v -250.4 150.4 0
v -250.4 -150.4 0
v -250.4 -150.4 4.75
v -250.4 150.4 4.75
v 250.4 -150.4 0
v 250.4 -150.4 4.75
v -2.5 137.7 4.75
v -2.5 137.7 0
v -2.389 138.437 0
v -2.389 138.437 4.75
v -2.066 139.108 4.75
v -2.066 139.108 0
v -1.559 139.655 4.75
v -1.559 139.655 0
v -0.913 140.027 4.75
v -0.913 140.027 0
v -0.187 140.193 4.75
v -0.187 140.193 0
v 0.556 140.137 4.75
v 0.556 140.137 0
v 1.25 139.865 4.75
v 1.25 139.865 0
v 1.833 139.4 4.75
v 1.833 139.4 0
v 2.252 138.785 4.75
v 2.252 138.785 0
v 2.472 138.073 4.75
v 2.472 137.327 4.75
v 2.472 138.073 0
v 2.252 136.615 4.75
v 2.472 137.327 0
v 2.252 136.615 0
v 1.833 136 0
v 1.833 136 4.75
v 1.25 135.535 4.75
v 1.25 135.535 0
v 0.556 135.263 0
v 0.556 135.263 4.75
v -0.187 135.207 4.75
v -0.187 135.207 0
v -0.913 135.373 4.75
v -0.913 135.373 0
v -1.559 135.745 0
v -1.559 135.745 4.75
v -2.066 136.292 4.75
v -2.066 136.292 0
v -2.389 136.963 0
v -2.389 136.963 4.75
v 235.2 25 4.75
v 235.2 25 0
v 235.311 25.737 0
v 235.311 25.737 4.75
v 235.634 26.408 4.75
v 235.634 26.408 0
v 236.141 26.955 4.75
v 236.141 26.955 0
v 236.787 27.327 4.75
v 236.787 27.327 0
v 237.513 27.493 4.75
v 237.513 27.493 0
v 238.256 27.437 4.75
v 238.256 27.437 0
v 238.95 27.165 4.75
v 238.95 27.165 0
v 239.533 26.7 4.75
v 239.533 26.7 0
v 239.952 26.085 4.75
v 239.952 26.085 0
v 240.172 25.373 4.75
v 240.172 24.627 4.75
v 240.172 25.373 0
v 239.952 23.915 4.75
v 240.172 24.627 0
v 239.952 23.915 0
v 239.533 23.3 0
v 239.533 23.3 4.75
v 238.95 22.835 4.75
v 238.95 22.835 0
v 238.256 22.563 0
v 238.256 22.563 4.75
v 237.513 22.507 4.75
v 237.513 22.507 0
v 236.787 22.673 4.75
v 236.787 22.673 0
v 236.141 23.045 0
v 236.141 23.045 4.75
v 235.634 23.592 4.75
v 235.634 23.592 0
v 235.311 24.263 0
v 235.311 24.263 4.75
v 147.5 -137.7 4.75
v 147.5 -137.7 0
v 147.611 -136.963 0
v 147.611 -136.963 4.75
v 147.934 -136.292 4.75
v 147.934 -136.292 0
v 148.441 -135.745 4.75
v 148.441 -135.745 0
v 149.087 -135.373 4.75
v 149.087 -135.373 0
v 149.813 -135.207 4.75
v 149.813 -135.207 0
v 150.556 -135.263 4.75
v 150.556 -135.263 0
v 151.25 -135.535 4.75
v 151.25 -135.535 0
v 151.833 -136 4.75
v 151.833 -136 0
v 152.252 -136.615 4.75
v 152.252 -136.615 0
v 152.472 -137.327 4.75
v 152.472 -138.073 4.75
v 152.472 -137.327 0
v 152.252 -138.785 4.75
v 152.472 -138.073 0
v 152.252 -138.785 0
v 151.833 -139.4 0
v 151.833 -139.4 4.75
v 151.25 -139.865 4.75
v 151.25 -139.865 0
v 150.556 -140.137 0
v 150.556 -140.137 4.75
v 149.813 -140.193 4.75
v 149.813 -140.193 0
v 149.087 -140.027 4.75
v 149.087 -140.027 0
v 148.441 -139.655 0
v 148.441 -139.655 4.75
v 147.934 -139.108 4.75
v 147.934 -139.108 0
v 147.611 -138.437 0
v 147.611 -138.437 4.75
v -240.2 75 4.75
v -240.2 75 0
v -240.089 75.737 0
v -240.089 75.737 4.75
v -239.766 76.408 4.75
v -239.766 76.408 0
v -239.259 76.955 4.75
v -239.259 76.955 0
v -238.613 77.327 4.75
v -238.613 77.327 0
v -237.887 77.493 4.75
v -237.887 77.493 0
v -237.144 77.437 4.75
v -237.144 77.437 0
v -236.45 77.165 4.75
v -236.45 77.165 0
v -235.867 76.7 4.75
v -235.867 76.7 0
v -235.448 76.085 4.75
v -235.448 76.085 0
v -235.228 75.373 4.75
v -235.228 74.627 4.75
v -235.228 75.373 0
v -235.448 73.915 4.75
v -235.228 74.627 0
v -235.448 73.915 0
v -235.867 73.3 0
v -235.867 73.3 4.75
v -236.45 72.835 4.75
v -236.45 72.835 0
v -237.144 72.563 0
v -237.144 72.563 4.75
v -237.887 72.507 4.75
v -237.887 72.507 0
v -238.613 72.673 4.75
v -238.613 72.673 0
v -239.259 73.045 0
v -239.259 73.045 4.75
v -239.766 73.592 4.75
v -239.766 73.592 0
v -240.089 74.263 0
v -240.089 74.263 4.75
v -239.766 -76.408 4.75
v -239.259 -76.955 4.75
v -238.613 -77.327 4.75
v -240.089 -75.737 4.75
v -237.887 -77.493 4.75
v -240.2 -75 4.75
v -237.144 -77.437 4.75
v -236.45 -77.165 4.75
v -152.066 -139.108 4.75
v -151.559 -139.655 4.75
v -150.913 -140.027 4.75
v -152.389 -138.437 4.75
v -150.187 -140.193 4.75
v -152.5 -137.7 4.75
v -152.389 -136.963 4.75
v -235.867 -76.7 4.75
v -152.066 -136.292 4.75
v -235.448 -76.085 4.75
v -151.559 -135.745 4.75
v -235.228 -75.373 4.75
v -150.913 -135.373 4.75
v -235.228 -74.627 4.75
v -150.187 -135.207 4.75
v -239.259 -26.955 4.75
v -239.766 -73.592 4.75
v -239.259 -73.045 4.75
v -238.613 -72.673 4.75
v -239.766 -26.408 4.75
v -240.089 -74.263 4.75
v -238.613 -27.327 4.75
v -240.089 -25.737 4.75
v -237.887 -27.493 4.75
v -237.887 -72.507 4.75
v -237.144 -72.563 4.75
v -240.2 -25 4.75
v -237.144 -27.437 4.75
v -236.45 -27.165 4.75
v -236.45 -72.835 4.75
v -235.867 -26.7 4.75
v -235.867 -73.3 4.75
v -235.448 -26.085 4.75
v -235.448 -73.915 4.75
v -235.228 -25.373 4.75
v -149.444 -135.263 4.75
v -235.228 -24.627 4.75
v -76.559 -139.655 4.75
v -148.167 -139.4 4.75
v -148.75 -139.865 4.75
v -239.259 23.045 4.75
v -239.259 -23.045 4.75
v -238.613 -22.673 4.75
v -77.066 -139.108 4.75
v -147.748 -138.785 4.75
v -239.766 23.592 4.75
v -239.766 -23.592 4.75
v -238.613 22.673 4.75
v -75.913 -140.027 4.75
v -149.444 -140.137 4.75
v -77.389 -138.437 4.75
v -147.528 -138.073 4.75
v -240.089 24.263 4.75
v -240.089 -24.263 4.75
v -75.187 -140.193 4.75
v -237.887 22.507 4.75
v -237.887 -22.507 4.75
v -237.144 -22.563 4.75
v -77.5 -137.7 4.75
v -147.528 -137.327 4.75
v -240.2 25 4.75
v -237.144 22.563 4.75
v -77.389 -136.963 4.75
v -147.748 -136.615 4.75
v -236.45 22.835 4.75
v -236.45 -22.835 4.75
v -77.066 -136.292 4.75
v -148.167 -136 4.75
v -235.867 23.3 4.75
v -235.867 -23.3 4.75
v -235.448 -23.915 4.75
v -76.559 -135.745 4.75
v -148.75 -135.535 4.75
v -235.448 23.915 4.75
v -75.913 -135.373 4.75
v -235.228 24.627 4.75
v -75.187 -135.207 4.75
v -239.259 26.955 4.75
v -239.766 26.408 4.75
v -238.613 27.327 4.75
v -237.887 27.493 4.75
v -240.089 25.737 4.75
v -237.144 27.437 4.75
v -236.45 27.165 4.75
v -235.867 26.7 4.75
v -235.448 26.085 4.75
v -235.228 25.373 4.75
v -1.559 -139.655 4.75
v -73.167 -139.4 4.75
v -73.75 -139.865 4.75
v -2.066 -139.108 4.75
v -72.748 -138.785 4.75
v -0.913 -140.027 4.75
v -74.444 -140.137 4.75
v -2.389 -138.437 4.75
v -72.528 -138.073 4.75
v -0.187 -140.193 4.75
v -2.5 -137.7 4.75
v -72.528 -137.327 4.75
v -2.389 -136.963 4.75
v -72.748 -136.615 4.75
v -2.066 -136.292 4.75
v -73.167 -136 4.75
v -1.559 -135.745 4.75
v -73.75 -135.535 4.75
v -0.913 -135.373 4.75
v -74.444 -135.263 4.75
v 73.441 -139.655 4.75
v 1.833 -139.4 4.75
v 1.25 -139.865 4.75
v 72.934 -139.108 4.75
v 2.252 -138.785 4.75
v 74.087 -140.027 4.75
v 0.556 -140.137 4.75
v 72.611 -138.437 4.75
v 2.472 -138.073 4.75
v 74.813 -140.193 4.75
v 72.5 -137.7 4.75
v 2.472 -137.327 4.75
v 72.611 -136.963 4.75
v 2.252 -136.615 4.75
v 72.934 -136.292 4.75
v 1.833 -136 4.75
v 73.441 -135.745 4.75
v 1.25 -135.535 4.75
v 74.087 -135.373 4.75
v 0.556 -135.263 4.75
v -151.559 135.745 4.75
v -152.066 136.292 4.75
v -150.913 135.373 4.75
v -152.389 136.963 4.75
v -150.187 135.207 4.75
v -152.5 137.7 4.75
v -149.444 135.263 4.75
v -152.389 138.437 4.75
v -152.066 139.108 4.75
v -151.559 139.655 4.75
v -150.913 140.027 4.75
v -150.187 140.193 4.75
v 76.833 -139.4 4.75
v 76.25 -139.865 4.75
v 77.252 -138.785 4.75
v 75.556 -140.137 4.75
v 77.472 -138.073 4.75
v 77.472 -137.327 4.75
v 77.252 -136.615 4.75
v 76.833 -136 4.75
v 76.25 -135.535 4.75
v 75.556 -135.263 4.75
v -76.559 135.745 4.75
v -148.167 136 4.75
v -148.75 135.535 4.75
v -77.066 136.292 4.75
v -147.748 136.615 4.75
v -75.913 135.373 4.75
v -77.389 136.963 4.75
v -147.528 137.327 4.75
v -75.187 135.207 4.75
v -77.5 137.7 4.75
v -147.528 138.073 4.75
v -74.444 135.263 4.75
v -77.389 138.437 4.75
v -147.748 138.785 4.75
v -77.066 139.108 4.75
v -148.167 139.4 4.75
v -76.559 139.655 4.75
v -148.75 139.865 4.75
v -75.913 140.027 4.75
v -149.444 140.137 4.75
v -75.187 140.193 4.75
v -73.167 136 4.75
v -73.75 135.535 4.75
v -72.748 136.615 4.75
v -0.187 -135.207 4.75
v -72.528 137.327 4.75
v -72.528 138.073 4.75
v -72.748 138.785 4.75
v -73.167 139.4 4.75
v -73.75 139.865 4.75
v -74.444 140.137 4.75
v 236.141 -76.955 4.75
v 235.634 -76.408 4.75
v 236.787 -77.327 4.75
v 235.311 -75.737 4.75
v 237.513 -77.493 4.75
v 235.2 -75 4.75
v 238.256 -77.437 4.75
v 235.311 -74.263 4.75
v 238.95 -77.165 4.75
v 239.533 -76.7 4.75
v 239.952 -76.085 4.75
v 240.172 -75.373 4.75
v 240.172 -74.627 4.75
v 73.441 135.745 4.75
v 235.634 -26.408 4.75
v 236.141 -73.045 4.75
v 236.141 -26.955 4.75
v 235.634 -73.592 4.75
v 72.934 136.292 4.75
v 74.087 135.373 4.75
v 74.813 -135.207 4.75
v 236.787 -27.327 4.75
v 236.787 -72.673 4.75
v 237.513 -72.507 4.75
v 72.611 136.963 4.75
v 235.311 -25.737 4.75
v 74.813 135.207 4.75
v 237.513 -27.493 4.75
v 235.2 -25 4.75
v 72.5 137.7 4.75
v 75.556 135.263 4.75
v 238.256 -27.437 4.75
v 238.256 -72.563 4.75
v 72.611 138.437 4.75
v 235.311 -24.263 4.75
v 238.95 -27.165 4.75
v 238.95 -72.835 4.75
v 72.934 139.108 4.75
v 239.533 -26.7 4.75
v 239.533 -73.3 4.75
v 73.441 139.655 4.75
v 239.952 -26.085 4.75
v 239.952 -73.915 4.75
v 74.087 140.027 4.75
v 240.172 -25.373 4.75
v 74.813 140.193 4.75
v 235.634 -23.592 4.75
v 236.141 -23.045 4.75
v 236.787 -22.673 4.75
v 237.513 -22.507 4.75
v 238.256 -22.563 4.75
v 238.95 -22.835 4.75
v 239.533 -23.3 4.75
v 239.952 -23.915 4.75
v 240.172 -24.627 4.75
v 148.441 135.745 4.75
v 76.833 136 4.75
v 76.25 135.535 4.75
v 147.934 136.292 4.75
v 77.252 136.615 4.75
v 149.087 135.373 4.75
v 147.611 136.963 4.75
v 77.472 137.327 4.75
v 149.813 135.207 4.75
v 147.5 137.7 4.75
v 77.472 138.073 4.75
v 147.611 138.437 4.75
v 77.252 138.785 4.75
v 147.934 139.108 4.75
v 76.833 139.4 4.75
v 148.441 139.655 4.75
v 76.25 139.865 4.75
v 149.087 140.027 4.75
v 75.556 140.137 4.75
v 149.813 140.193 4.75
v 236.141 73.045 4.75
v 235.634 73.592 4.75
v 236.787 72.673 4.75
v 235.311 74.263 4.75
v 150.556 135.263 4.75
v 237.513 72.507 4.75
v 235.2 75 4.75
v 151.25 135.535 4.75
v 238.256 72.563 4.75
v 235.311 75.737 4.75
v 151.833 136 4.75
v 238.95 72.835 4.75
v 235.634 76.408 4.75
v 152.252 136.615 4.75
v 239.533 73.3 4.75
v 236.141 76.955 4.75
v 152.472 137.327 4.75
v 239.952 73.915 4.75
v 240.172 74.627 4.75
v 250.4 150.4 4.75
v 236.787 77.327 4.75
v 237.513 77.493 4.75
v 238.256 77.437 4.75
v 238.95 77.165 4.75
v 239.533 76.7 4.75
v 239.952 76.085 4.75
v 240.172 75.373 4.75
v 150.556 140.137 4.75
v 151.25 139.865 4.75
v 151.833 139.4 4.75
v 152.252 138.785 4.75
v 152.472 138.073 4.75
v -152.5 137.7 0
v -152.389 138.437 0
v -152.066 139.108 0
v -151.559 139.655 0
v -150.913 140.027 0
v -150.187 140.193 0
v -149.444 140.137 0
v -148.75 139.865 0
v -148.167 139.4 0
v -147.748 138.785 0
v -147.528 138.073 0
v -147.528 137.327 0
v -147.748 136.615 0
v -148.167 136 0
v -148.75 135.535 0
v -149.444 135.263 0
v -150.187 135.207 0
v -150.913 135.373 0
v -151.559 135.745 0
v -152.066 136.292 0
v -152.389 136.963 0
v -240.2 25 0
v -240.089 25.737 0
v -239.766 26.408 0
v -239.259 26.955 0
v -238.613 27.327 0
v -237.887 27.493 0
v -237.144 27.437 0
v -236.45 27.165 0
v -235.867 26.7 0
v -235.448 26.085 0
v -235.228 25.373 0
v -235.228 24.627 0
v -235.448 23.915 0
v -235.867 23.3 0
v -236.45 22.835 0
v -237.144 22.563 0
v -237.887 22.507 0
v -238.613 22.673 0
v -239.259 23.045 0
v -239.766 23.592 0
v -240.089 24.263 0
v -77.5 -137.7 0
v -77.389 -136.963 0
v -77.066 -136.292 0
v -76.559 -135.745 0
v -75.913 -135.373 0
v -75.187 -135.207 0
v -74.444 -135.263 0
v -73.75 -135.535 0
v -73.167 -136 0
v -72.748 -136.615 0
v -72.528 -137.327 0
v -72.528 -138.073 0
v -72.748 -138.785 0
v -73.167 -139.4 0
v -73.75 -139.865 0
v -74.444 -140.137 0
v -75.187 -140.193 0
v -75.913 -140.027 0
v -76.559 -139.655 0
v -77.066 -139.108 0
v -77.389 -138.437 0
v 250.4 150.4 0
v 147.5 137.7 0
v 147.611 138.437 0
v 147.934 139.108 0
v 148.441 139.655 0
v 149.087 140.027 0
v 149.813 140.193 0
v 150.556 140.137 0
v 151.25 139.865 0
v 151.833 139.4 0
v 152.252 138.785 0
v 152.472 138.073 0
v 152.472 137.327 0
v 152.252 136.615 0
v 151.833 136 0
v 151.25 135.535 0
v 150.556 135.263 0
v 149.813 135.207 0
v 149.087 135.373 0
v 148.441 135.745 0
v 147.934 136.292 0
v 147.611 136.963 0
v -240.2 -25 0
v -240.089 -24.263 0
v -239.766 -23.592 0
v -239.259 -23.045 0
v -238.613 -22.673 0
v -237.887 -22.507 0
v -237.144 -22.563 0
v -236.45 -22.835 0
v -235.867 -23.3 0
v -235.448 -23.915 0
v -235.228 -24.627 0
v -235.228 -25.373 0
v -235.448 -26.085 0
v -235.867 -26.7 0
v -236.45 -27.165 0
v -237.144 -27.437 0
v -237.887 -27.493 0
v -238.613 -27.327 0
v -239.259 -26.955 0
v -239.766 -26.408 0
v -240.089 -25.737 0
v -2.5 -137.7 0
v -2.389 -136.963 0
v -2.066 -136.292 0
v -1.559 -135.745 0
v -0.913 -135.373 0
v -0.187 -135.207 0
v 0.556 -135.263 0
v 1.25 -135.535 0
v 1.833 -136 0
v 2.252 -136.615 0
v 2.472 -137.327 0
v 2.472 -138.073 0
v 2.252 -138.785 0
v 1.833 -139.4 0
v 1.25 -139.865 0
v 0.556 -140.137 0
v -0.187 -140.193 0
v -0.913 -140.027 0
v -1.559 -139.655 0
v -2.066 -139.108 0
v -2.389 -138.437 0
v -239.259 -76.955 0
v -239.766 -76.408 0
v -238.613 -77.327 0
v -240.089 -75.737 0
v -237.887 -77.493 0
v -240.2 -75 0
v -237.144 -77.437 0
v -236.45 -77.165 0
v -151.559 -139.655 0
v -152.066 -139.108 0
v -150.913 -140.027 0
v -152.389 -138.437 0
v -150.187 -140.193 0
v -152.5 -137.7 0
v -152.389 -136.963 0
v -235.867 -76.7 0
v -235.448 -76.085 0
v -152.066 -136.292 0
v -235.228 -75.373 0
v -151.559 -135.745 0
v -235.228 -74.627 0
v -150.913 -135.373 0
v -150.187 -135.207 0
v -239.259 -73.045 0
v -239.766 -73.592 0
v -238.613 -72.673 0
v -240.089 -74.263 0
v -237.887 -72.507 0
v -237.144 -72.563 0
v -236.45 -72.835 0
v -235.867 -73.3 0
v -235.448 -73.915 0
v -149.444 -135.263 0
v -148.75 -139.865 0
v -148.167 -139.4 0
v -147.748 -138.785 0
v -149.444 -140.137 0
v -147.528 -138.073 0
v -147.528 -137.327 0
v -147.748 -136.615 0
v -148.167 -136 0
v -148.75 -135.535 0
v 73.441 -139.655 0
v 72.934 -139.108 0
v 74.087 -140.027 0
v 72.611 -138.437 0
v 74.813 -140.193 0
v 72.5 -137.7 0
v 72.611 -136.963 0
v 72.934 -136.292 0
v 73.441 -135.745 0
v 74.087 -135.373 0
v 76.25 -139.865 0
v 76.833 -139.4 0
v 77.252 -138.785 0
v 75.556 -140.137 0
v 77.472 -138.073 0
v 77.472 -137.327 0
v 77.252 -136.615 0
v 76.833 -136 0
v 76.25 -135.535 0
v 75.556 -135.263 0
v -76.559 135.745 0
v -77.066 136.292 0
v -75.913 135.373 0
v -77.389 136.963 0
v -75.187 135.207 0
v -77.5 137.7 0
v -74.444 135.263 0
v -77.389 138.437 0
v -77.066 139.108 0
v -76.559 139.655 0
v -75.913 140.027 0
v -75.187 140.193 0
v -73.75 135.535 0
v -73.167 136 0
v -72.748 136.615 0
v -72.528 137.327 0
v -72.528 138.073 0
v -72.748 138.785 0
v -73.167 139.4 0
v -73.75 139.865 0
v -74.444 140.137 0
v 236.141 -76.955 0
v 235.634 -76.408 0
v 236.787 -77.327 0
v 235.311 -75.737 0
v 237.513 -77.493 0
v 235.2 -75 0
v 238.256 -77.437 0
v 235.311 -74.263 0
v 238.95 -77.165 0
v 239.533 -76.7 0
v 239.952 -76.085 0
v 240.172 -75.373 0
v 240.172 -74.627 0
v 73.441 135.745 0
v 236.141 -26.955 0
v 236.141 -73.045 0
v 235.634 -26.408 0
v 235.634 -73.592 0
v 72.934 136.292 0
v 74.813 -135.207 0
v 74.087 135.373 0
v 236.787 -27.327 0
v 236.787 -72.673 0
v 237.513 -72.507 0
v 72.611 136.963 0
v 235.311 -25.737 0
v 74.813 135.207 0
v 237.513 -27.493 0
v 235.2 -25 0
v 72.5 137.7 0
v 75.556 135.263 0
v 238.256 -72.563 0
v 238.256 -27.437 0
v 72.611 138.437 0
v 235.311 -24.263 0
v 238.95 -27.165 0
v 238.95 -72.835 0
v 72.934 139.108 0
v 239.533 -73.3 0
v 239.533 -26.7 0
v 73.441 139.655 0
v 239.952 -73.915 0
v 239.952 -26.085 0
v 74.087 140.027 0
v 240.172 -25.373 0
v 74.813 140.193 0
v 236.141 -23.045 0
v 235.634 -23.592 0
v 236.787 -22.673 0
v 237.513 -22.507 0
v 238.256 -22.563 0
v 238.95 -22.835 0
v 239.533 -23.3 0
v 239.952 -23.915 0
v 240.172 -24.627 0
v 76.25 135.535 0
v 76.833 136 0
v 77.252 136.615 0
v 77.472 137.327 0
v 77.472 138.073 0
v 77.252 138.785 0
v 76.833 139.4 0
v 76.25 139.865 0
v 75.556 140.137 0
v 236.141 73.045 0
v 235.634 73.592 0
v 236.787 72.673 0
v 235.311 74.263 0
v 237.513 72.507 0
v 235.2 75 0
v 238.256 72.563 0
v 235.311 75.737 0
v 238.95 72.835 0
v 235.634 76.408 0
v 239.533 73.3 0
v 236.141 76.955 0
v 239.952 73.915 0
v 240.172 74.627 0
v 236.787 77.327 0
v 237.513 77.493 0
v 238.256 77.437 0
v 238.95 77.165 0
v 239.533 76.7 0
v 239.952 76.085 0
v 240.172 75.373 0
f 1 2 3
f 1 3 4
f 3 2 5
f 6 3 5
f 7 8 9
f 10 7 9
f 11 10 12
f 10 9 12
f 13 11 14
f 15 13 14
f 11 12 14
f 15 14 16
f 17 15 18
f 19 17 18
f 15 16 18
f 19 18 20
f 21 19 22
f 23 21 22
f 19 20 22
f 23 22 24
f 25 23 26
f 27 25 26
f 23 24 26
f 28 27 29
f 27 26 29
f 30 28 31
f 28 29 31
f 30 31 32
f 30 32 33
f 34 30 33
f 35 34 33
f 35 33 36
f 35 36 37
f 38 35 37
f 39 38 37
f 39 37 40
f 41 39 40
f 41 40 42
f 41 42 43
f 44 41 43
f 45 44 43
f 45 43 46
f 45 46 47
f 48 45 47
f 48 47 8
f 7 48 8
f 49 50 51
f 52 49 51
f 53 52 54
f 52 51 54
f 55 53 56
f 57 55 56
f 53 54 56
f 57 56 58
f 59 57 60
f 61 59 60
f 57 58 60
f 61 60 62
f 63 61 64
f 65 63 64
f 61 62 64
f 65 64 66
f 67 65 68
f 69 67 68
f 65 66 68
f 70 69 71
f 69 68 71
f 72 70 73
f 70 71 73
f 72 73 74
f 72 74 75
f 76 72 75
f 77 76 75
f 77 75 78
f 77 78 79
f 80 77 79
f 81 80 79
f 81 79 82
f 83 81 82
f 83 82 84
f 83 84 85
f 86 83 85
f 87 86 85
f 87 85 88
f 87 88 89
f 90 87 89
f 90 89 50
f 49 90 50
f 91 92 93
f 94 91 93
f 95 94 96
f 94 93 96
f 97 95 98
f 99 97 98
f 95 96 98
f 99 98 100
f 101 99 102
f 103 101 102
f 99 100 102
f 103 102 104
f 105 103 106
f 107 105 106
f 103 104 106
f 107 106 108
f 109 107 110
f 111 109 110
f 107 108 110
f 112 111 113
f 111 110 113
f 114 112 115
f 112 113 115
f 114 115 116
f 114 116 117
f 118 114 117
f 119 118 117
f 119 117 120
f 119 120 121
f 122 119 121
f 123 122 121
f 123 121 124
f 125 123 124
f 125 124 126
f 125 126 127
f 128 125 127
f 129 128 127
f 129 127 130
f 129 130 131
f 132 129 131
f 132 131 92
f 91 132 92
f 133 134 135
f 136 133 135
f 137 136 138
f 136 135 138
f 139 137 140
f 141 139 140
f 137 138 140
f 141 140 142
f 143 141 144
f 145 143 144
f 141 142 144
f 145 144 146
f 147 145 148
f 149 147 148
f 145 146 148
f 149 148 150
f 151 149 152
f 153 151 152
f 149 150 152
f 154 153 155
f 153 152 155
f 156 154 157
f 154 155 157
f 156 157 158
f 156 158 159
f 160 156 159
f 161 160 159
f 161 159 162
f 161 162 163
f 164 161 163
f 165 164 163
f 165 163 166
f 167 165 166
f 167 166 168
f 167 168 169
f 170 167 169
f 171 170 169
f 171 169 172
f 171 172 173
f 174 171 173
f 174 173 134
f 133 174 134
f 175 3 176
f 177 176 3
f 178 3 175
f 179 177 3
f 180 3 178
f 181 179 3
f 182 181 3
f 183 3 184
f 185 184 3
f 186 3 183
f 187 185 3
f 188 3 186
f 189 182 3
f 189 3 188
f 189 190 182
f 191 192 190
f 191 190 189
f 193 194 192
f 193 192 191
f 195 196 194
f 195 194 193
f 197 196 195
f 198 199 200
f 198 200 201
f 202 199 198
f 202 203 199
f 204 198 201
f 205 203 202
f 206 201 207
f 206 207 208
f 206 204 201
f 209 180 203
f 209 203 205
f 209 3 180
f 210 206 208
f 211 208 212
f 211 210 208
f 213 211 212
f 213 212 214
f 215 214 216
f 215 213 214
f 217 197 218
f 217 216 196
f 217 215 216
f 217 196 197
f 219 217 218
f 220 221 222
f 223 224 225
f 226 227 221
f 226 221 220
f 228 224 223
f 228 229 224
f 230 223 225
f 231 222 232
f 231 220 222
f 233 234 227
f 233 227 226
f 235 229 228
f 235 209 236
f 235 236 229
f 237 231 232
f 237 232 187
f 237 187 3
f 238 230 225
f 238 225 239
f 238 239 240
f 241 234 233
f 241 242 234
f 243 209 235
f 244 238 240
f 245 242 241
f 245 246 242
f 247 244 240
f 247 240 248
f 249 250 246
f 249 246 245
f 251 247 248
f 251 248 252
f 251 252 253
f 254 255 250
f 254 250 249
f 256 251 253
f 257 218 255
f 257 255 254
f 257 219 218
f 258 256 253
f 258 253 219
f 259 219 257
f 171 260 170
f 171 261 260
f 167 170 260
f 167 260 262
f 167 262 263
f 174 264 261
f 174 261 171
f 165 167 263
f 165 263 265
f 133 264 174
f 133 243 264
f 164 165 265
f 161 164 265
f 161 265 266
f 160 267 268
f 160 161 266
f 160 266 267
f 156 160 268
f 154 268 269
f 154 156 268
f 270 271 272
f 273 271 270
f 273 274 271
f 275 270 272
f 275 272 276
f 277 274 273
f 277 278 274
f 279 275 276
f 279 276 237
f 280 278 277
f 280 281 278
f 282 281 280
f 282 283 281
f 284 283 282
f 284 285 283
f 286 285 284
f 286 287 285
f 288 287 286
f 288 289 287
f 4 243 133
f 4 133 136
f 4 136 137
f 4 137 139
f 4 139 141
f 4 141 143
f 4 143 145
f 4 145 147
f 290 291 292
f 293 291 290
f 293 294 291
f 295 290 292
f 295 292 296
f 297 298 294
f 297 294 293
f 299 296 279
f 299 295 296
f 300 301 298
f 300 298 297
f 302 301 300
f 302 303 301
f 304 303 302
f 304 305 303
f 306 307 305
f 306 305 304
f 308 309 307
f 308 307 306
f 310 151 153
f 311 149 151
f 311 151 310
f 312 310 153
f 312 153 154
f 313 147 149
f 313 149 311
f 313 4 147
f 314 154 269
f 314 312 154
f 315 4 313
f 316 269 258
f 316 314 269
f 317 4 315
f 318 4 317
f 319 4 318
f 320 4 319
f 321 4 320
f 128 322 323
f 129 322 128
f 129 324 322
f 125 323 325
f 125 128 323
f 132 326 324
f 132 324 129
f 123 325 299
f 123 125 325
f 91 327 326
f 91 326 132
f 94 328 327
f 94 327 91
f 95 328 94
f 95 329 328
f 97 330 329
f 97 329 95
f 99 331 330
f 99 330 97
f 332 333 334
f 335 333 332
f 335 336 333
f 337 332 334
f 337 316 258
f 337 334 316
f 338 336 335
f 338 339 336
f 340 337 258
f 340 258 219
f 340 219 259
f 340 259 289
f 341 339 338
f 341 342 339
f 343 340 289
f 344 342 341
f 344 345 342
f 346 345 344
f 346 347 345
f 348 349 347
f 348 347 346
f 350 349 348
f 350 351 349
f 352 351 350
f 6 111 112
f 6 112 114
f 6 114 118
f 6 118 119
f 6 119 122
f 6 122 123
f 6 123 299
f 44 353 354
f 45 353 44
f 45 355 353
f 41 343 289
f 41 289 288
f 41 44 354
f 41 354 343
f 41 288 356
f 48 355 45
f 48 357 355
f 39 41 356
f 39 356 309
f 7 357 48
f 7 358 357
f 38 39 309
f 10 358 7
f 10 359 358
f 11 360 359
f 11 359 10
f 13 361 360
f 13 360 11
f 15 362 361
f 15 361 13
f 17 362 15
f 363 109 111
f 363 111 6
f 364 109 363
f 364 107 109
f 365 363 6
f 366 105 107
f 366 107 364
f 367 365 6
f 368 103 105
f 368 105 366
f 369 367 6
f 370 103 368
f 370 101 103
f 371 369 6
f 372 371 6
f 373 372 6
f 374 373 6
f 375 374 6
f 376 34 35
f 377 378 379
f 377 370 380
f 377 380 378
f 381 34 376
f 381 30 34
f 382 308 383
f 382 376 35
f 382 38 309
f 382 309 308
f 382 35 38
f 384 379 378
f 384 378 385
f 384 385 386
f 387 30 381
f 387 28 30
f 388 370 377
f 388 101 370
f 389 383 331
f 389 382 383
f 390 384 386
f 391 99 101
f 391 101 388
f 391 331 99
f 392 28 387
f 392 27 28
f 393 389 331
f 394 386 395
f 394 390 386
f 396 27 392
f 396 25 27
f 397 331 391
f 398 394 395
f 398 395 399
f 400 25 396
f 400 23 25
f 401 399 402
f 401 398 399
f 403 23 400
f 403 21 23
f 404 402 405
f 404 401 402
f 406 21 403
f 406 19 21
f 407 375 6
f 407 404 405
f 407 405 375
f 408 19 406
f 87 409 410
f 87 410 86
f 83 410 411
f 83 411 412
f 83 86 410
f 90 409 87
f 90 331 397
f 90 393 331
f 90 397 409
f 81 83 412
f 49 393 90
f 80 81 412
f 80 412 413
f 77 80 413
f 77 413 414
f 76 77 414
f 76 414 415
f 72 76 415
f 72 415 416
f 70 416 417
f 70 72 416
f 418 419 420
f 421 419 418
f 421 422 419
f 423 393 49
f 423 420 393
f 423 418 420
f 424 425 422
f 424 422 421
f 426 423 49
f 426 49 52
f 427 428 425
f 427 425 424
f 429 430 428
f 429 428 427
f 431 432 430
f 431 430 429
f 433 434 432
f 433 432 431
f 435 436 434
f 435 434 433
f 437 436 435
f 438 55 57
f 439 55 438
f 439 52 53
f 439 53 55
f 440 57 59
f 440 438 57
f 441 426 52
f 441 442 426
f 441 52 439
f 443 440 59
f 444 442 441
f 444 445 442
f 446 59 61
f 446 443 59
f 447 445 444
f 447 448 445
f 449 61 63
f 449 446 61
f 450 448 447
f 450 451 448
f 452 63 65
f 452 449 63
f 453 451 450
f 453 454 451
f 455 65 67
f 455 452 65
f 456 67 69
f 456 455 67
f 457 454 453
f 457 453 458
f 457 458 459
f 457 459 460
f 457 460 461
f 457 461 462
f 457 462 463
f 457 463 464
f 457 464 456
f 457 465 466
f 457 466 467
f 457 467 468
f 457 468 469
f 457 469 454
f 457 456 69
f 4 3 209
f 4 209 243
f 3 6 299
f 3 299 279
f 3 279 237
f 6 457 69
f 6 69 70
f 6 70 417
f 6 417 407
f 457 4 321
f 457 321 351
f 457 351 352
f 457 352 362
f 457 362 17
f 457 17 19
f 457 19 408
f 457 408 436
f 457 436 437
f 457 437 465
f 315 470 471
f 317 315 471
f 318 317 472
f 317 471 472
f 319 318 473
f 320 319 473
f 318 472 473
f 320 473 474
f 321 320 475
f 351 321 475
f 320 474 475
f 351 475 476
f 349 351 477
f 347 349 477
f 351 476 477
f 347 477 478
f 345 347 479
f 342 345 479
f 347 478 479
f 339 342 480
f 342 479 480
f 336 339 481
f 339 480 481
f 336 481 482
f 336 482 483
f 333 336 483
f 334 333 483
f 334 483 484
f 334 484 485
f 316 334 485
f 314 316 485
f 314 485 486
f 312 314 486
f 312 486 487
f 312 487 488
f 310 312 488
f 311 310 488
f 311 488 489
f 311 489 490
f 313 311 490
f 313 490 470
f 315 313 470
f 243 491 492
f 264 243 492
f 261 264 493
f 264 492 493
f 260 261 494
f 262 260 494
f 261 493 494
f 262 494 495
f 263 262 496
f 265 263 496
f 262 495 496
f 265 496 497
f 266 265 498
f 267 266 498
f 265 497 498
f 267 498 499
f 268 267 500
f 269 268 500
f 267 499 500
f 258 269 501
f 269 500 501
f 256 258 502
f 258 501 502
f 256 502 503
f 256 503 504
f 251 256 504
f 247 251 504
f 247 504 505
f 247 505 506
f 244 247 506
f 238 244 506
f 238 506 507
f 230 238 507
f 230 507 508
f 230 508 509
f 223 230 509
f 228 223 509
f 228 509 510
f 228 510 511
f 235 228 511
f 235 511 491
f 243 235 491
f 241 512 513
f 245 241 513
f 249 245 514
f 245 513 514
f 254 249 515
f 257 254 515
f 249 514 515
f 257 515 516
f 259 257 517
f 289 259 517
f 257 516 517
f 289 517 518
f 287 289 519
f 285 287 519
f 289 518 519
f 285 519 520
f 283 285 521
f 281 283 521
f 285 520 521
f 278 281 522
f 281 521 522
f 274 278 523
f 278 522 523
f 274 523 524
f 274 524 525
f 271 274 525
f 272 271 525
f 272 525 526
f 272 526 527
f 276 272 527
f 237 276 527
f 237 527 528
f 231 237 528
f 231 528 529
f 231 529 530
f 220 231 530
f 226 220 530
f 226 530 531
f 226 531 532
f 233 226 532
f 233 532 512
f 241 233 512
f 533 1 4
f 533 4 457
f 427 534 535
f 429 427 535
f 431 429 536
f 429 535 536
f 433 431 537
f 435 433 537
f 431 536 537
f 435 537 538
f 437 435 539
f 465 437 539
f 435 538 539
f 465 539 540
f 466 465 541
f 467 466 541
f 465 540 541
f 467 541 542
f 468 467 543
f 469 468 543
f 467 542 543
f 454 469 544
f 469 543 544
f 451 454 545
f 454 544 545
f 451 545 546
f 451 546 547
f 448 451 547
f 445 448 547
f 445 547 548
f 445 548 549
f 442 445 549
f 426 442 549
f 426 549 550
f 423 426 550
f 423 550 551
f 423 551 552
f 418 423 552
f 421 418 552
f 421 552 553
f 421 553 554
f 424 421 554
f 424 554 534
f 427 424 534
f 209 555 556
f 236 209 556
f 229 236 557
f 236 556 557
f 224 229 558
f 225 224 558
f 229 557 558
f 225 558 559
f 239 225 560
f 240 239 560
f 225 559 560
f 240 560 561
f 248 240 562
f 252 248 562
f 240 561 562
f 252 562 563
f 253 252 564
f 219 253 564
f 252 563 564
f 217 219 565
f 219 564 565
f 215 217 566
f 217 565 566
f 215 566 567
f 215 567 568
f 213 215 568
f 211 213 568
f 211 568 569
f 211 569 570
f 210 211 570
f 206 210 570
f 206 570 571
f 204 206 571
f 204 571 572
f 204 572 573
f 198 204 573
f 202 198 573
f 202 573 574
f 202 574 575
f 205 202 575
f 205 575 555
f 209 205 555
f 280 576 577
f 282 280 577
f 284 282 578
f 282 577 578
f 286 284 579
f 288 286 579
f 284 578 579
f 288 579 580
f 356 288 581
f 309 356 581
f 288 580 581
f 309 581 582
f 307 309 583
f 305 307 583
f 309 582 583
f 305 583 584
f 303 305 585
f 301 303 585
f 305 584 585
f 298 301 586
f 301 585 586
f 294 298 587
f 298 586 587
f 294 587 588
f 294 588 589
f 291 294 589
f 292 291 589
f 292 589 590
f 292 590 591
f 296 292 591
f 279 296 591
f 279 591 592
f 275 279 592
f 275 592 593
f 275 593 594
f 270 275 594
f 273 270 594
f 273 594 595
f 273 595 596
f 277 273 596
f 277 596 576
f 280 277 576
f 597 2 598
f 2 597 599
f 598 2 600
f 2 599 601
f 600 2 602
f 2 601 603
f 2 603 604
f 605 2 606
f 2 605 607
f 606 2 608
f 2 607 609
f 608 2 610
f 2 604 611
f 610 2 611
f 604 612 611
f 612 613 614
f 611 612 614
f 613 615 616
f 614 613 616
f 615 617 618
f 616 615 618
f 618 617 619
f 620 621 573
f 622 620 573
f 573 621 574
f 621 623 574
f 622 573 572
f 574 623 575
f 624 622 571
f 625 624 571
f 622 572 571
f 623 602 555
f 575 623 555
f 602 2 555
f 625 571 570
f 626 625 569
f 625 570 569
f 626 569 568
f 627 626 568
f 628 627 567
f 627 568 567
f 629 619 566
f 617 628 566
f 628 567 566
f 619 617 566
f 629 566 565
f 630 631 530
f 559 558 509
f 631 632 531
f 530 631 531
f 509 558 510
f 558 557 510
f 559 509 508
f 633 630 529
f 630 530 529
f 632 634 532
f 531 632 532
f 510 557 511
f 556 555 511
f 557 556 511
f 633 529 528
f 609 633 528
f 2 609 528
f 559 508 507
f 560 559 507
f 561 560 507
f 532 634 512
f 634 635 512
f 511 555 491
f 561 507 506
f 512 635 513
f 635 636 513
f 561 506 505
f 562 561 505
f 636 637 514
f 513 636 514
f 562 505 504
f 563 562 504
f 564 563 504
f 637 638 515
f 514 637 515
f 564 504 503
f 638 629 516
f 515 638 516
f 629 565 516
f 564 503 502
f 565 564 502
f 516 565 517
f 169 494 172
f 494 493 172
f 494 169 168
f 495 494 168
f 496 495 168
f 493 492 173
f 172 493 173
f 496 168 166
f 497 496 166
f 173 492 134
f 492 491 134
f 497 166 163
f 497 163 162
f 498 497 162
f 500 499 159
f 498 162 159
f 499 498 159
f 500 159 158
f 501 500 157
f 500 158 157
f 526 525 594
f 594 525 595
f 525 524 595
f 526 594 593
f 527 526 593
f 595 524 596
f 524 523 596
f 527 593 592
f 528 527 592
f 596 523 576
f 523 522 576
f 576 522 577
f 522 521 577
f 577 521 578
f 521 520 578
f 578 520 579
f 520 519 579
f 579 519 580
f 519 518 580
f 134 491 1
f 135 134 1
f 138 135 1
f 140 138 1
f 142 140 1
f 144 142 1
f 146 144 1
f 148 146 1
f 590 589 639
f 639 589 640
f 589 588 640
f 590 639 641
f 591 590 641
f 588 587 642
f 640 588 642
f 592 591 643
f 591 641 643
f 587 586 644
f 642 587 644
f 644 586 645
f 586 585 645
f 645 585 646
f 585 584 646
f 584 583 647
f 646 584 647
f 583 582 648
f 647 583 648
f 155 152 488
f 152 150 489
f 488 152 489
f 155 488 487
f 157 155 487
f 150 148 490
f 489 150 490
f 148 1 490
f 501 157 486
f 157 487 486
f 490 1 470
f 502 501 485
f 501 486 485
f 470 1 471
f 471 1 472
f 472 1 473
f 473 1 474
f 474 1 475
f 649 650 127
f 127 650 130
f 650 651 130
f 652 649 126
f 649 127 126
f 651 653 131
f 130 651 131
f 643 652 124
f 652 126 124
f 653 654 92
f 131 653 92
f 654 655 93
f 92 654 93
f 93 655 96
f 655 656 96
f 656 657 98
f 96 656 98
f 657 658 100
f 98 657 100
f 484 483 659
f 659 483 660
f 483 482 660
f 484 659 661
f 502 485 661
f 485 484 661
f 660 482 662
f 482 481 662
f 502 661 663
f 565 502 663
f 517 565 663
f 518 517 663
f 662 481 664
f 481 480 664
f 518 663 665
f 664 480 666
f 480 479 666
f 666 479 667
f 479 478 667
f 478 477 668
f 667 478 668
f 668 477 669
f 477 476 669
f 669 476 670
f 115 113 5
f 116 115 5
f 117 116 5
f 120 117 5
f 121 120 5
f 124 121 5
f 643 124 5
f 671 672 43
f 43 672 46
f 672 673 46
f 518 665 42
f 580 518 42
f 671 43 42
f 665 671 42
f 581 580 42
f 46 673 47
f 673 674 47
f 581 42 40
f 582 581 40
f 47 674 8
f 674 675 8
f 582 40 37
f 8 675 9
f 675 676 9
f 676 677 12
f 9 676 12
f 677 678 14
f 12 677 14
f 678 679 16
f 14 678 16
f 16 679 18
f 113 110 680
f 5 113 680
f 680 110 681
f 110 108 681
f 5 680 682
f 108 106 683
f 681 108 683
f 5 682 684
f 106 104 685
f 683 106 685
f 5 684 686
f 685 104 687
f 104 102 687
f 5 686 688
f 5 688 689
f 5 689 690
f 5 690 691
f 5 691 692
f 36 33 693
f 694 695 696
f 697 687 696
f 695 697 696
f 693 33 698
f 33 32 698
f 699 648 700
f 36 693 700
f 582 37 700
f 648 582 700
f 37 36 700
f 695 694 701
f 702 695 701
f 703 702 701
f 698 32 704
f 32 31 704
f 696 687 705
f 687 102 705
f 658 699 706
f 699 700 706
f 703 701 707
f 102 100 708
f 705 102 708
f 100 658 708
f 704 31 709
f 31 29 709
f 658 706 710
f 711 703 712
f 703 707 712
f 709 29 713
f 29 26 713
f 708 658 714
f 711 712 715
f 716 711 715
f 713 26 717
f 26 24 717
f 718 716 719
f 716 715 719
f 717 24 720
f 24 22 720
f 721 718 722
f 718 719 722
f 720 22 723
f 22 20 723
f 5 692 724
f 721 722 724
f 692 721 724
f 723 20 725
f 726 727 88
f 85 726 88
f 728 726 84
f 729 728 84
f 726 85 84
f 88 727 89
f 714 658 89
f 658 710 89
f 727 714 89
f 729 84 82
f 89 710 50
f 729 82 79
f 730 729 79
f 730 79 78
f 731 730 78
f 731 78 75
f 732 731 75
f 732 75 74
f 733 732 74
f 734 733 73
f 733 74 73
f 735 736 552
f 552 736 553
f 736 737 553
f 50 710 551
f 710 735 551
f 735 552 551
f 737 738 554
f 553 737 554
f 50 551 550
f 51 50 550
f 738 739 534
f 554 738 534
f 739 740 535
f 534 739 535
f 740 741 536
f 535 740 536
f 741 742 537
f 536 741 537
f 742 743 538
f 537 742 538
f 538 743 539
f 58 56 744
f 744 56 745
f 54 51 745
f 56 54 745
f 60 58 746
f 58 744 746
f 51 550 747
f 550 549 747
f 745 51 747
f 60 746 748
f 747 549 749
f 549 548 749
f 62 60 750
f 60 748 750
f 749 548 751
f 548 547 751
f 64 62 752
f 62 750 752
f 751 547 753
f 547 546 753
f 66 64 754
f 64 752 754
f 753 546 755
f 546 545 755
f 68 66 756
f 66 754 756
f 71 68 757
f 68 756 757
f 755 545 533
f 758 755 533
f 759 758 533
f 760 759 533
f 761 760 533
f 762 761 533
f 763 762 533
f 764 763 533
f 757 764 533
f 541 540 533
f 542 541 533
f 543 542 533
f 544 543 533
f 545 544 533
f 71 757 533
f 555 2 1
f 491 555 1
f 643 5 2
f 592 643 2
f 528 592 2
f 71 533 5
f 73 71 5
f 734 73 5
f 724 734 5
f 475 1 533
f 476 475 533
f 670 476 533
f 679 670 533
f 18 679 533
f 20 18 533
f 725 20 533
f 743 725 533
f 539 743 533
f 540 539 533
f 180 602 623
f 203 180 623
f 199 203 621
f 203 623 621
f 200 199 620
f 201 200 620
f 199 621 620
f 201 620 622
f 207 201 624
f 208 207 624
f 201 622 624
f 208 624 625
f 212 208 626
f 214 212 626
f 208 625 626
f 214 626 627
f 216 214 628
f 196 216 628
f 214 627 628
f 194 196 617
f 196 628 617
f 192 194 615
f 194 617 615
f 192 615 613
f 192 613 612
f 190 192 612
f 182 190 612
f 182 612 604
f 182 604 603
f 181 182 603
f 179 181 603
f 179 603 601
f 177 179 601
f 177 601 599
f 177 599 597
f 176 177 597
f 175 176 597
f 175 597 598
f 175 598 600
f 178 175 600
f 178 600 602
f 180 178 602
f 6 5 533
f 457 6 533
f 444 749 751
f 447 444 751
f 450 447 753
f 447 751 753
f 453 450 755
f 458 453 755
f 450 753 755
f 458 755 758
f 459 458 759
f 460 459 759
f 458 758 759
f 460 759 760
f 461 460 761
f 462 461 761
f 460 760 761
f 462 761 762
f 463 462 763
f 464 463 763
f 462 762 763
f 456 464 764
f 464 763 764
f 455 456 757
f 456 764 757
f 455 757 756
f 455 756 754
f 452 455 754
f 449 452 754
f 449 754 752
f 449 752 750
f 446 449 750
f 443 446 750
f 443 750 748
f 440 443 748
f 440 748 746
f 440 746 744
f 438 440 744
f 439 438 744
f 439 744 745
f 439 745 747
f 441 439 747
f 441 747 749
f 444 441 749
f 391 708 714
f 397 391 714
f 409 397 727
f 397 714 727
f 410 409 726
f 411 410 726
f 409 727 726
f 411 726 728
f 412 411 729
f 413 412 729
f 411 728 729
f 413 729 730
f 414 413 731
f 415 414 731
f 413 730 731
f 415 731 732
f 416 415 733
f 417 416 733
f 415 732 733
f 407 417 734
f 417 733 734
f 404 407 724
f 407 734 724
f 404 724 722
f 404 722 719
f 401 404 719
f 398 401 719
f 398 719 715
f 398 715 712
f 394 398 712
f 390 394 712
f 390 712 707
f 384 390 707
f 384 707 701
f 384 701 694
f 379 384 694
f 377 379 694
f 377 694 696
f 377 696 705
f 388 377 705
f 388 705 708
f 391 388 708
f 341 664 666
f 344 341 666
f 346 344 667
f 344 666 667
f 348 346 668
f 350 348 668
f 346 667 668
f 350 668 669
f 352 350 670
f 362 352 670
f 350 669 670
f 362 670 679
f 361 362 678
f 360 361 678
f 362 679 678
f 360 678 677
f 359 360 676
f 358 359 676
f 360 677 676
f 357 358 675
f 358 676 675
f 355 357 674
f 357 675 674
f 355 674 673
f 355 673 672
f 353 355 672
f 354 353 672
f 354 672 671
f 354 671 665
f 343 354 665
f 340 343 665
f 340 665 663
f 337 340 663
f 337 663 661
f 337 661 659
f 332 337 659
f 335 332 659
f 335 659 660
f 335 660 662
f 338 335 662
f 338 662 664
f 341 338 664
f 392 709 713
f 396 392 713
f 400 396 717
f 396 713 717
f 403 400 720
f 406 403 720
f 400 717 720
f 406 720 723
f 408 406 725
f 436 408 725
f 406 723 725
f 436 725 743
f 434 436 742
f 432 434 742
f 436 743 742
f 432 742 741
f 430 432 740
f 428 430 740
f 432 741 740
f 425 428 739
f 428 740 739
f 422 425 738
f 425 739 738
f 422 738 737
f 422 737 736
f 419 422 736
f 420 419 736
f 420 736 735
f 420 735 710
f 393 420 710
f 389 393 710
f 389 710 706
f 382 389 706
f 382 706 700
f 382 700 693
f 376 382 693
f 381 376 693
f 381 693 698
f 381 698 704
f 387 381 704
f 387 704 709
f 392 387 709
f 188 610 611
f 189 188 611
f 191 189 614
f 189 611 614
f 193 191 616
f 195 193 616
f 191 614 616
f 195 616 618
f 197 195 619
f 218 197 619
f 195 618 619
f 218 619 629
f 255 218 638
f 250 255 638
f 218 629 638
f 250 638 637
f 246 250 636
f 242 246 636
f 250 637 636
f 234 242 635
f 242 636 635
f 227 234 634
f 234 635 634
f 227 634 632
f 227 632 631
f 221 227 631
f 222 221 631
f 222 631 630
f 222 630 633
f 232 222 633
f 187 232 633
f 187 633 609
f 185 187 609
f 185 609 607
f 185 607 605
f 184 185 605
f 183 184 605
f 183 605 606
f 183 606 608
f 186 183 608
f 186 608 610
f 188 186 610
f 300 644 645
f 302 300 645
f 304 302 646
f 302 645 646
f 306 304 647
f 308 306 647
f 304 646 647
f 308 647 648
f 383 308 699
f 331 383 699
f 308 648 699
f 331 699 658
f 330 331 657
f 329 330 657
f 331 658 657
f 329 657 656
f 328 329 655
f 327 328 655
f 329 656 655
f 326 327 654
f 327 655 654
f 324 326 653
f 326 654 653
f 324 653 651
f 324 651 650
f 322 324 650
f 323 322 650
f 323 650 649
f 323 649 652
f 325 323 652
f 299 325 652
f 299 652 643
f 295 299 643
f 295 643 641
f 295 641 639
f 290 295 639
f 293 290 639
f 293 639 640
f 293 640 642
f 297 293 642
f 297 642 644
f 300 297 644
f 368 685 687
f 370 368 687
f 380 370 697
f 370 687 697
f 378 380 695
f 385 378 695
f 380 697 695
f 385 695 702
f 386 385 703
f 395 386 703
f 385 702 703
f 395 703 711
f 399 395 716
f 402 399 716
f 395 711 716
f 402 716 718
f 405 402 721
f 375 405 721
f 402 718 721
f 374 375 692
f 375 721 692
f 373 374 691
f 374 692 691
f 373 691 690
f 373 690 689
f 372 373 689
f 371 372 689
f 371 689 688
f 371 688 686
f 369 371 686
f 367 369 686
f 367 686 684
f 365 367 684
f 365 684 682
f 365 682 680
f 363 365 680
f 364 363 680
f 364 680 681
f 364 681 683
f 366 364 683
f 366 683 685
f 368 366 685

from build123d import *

# Parameters (mm, degrees)
SKETCH_1_W          = 500.8
SKETCH_1_H          = 300.8
EXTRUDE_1_DEPTH     = 4.75
SKETCH_3_R          = 2.5
CUT_EXTRUDE_1_DEPTH = 10
SKETCH_4_R          = 2.5
CUT_EXTRUDE_2_DEPTH = 10
SKETCH_5_R          = 2.5
CUT_EXTRUDE_3_DEPTH = 10
SKETCH_6_R          = 2.5
CUT_EXTRUDE_4_DEPTH = 10


with BuildPart() as part:
    # 草圖1 → 填料-伸長1 (new body)
    with BuildSketch(Plane.XY):
        Rectangle(SKETCH_1_W, SKETCH_1_H)
    extrude(amount=EXTRUDE_1_DEPTH)

    # 草圖3 → 除料-伸長1 (cut)
    with BuildSketch(Plane(origin=(0, 0, 0), x_dir=(-1, 0, 0), z_dir=(0, 0, -1))):
        with Locations((-150, 137.7)):
            Circle(SKETCH_3_R)
        with Locations((-75, 137.7)):
            Circle(SKETCH_3_R)
        with Locations((0, 137.7)):
            Circle(SKETCH_3_R)
        with Locations((75, 137.7)):
            Circle(SKETCH_3_R)
        with Locations((150, 137.7)):
            Circle(SKETCH_3_R)
    extrude(amount=-CUT_EXTRUDE_1_DEPTH, mode=Mode.SUBTRACT)

    # 草圖4 → 除料-伸長2 (cut)
    with BuildSketch(Plane(origin=(0, 0, 0), x_dir=(-1, 0, 0), z_dir=(0, 0, -1))):
        with Locations((-237.7, 75)):
            Circle(SKETCH_4_R)
        with Locations((-237.7, 25)):
            Circle(SKETCH_4_R)
        with Locations((-237.7, -25)):
            Circle(SKETCH_4_R)
        with Locations((-237.7, -75)):
            Circle(SKETCH_4_R)
    extrude(amount=-CUT_EXTRUDE_2_DEPTH, mode=Mode.SUBTRACT)

    # 草圖5 → 除料-伸長3 (cut)
    with BuildSketch(Plane(origin=(0, 0, 0), x_dir=(-1, 0, 0), z_dir=(0, 0, -1))):
        with Locations((237.7, 75)):
            Circle(SKETCH_5_R)
        with Locations((237.7, 25)):
            Circle(SKETCH_5_R)
        with Locations((237.7, -25)):
            Circle(SKETCH_5_R)
        with Locations((237.7, -75)):
            Circle(SKETCH_5_R)
    extrude(amount=-CUT_EXTRUDE_3_DEPTH, mode=Mode.SUBTRACT)

    # 草圖6 → 除料-伸長4 (cut)
    with BuildSketch(Plane(origin=(0, 0, 0), x_dir=(-1, 0, 0), z_dir=(0, 0, -1))):
        with Locations((150, -137.7)):
            Circle(SKETCH_6_R)
        with Locations((75, -137.7)):
            Circle(SKETCH_6_R)
        with Locations((0, -137.7)):
            Circle(SKETCH_6_R)
        with Locations((-75, -137.7)):
            Circle(SKETCH_6_R)
        with Locations((-150, -137.7)):
            Circle(SKETCH_6_R)
    extrude(amount=-CUT_EXTRUDE_4_DEPTH, mode=Mode.SUBTRACT)


solid = part.part
